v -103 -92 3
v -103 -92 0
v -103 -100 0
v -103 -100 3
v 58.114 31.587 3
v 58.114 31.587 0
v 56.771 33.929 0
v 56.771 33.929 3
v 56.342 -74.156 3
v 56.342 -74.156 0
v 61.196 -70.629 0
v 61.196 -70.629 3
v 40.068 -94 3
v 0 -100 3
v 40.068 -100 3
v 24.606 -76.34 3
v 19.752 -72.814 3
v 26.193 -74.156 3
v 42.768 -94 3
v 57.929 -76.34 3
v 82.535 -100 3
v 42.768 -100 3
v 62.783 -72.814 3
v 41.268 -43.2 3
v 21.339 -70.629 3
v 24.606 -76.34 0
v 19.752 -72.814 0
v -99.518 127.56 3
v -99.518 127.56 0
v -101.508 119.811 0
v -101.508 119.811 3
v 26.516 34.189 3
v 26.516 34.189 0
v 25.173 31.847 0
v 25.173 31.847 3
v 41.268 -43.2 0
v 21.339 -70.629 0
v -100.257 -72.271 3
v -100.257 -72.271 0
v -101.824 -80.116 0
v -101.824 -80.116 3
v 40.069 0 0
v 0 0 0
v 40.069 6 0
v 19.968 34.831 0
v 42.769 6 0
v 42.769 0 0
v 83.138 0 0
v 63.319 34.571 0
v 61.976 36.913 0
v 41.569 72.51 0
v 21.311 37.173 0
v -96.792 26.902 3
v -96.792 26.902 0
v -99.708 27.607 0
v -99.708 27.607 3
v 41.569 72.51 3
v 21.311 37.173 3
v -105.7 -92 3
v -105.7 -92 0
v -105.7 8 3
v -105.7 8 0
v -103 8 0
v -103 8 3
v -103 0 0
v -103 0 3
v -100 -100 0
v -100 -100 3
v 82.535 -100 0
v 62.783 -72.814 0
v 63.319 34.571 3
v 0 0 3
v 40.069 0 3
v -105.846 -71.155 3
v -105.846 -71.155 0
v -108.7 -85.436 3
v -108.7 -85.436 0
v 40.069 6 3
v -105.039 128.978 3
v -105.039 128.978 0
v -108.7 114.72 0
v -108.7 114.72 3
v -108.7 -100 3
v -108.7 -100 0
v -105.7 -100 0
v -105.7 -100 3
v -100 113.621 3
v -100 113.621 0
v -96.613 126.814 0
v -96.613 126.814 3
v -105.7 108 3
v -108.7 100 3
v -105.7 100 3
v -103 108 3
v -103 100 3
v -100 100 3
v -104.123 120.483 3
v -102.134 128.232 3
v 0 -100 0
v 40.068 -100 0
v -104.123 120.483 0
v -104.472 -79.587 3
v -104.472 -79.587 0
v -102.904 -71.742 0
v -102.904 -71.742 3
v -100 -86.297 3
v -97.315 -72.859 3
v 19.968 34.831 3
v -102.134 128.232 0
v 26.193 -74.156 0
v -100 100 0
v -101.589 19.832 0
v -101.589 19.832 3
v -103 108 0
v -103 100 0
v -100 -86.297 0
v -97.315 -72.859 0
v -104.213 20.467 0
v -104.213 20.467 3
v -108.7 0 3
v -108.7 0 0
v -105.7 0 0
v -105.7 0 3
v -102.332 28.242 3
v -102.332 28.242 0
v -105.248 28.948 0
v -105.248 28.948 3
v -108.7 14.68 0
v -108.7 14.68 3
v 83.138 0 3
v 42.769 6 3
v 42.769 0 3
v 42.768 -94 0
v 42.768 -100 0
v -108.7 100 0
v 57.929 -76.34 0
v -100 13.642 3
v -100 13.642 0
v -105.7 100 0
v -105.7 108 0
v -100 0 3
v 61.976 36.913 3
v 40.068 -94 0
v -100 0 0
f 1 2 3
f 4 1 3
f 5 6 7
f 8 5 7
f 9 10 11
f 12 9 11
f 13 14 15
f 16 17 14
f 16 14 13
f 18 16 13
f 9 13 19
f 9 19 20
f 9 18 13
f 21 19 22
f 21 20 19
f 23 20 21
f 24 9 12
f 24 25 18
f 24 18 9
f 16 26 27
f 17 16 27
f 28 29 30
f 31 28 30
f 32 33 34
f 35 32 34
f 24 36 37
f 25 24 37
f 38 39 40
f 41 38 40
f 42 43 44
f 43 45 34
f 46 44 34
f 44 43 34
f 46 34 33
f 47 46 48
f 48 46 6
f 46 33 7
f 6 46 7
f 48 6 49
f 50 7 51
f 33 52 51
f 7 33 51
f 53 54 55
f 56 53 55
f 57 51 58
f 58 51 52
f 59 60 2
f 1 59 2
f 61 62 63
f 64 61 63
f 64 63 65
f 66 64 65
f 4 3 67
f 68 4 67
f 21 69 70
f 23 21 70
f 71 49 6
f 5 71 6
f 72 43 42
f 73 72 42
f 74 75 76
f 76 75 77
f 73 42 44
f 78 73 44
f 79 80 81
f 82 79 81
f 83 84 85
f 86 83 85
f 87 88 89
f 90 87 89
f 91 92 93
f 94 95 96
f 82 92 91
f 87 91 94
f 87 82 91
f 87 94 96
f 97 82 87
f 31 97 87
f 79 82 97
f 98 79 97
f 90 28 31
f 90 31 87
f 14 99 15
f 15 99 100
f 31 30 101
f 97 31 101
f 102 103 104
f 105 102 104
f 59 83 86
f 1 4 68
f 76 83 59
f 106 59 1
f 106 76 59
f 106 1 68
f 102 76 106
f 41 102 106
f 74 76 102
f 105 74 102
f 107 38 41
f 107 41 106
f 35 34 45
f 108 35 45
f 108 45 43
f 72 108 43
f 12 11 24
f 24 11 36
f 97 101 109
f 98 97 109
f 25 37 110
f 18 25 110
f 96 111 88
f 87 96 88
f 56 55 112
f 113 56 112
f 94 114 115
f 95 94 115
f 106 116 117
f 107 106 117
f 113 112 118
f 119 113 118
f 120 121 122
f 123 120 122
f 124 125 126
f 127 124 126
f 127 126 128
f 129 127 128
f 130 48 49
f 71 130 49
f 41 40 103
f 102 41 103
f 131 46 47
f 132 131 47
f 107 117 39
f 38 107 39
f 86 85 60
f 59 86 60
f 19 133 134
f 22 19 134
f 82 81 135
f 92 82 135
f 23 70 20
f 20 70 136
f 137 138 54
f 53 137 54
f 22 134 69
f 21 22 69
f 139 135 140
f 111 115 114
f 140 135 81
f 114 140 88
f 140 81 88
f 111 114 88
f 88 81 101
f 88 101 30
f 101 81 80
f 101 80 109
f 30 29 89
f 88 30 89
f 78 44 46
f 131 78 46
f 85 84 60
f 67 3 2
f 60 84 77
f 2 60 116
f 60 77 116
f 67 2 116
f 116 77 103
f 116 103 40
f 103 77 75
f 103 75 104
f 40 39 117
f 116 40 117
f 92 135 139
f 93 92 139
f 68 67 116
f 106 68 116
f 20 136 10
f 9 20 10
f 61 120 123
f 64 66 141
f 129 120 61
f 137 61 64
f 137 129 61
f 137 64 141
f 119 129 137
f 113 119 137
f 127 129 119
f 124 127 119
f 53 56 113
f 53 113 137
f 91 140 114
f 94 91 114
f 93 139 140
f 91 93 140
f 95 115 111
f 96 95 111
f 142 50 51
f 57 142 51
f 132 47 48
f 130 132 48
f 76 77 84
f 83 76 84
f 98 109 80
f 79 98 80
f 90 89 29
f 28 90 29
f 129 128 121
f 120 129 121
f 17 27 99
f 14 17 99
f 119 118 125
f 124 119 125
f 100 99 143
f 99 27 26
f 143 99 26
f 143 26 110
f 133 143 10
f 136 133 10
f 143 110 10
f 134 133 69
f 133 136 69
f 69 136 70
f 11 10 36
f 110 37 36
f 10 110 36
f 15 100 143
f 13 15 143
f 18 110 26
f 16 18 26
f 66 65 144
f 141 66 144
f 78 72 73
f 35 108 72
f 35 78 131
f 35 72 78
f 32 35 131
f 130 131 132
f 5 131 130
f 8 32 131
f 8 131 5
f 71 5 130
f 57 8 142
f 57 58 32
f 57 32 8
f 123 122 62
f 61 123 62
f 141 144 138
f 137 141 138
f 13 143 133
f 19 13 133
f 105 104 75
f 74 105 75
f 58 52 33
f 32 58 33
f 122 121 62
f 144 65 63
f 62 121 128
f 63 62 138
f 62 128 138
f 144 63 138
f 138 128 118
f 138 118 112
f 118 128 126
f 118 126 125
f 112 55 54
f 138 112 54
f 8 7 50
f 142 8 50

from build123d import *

# Parameters (mm, degrees)
F2_DEPTH  = 3
F4_DEPTH  = 3
F6_DEPTH  = 3
F8_DEPTH  = 3
F10_DEPTH = 3


with BuildPart() as f2:
    # F1 (on Top) → F2 (new body)
    with BuildSketch(Plane.XY):
        Polygon((19.968103654, 34.8310246878), (0, 0), (40.0688946405, 0), (40.0688946405, 6), (42.7688946405, 6), (42.7688946405, 0), (83.137789281, 0), (63.3188913913, 34.5707601304), (58.1136002415, 31.5866448435), (56.7707483624, 33.9290258609), (61.9760395122, 36.9131411478), (41.5688946405, 72.509999976), (21.3109555331, 37.1734057053), (26.5162466829, 34.1892904184), (25.1733948038, 31.846909401), align=None)
    extrude(amount=F2_DEPTH)


with BuildPart() as f4:
    # F3 (on Top) → F4 (new body)
    with BuildSketch(Plane.XY):
        Polygon((19.7521299169, -72.8135254916), (0, -100), (40.0676155907, -100), (40.0676155907, -94), (42.7676155907, -94), (42.7676155907, -100), (82.5352311814, -100), (62.7831012645, -72.8135254916), (57.9289992982, -76.3402370053), (56.3419791171, -74.1558911205), (61.1960810833, -70.6291796067), (41.2676155907, -43.2), (21.3391500981, -70.6291796068), (26.1932520644, -74.1558911205), (24.6062318832, -76.3402370053), align=None)
    extrude(amount=F4_DEPTH)


with BuildPart() as f6:
    # F5 (on Top) → F6 (new body)
    with BuildSketch(Plane.XY):
        Polygon((-103, 0), (-100, 0), (-100, 13.642271658), (-96.7921274148, 26.9020276688), (-99.7080104166, 27.6074540081), (-101.5891473214, 19.8317660035), (-104.2134420229, 20.4666497088), (-102.3323051181, 28.2423377135), (-105.2481881199, 28.9477640528), (-108.7, 14.6796838499), (-108.7, 0), (-105.7, 0), (-105.7, 8), (-103, 8), align=None)
    extrude(amount=F6_DEPTH)


with BuildPart() as f8:
    # F7 (on Top) → F8 (new body)
    with BuildSketch(Plane.XY):
        Polygon((-103, -100), (-100, -100), (-100, -86.2967959619), (-97.314910005, -72.8592332131), (-100.2567539806, -72.2713947803), (-101.8243231345, -80.1163120487), (-104.4719827126, -79.5872574593), (-102.9044135587, -71.7423401909), (-105.8462575343, -71.1545017582), (-108.7, -85.4360876724), (-108.7, -100), (-105.7, -100), (-105.7, -92), (-103, -92), align=None)
    extrude(amount=F8_DEPTH)


with BuildPart() as f10:
    # F9 (on Top) → F10 (new body)
    with BuildSketch(Plane.XY):
        Polygon((-103, 100), (-100, 100), (-100, 113.6210118647), (-96.6125920963, 126.8140945943), (-99.5183415797, 127.5601642558), (-101.507860677, 119.8114989668), (-104.1230352121, 120.4829616621), (-102.1335161147, 128.2316269511), (-105.0392655981, 128.9776966126), (-108.7, 114.7200774571), (-108.7, 100), (-105.7, 100), (-105.7, 108), (-103, 108), align=None)
    extrude(amount=F10_DEPTH)


solid = Compound([f2.part, f4.part, f6.part, f8.part, f10.part])
